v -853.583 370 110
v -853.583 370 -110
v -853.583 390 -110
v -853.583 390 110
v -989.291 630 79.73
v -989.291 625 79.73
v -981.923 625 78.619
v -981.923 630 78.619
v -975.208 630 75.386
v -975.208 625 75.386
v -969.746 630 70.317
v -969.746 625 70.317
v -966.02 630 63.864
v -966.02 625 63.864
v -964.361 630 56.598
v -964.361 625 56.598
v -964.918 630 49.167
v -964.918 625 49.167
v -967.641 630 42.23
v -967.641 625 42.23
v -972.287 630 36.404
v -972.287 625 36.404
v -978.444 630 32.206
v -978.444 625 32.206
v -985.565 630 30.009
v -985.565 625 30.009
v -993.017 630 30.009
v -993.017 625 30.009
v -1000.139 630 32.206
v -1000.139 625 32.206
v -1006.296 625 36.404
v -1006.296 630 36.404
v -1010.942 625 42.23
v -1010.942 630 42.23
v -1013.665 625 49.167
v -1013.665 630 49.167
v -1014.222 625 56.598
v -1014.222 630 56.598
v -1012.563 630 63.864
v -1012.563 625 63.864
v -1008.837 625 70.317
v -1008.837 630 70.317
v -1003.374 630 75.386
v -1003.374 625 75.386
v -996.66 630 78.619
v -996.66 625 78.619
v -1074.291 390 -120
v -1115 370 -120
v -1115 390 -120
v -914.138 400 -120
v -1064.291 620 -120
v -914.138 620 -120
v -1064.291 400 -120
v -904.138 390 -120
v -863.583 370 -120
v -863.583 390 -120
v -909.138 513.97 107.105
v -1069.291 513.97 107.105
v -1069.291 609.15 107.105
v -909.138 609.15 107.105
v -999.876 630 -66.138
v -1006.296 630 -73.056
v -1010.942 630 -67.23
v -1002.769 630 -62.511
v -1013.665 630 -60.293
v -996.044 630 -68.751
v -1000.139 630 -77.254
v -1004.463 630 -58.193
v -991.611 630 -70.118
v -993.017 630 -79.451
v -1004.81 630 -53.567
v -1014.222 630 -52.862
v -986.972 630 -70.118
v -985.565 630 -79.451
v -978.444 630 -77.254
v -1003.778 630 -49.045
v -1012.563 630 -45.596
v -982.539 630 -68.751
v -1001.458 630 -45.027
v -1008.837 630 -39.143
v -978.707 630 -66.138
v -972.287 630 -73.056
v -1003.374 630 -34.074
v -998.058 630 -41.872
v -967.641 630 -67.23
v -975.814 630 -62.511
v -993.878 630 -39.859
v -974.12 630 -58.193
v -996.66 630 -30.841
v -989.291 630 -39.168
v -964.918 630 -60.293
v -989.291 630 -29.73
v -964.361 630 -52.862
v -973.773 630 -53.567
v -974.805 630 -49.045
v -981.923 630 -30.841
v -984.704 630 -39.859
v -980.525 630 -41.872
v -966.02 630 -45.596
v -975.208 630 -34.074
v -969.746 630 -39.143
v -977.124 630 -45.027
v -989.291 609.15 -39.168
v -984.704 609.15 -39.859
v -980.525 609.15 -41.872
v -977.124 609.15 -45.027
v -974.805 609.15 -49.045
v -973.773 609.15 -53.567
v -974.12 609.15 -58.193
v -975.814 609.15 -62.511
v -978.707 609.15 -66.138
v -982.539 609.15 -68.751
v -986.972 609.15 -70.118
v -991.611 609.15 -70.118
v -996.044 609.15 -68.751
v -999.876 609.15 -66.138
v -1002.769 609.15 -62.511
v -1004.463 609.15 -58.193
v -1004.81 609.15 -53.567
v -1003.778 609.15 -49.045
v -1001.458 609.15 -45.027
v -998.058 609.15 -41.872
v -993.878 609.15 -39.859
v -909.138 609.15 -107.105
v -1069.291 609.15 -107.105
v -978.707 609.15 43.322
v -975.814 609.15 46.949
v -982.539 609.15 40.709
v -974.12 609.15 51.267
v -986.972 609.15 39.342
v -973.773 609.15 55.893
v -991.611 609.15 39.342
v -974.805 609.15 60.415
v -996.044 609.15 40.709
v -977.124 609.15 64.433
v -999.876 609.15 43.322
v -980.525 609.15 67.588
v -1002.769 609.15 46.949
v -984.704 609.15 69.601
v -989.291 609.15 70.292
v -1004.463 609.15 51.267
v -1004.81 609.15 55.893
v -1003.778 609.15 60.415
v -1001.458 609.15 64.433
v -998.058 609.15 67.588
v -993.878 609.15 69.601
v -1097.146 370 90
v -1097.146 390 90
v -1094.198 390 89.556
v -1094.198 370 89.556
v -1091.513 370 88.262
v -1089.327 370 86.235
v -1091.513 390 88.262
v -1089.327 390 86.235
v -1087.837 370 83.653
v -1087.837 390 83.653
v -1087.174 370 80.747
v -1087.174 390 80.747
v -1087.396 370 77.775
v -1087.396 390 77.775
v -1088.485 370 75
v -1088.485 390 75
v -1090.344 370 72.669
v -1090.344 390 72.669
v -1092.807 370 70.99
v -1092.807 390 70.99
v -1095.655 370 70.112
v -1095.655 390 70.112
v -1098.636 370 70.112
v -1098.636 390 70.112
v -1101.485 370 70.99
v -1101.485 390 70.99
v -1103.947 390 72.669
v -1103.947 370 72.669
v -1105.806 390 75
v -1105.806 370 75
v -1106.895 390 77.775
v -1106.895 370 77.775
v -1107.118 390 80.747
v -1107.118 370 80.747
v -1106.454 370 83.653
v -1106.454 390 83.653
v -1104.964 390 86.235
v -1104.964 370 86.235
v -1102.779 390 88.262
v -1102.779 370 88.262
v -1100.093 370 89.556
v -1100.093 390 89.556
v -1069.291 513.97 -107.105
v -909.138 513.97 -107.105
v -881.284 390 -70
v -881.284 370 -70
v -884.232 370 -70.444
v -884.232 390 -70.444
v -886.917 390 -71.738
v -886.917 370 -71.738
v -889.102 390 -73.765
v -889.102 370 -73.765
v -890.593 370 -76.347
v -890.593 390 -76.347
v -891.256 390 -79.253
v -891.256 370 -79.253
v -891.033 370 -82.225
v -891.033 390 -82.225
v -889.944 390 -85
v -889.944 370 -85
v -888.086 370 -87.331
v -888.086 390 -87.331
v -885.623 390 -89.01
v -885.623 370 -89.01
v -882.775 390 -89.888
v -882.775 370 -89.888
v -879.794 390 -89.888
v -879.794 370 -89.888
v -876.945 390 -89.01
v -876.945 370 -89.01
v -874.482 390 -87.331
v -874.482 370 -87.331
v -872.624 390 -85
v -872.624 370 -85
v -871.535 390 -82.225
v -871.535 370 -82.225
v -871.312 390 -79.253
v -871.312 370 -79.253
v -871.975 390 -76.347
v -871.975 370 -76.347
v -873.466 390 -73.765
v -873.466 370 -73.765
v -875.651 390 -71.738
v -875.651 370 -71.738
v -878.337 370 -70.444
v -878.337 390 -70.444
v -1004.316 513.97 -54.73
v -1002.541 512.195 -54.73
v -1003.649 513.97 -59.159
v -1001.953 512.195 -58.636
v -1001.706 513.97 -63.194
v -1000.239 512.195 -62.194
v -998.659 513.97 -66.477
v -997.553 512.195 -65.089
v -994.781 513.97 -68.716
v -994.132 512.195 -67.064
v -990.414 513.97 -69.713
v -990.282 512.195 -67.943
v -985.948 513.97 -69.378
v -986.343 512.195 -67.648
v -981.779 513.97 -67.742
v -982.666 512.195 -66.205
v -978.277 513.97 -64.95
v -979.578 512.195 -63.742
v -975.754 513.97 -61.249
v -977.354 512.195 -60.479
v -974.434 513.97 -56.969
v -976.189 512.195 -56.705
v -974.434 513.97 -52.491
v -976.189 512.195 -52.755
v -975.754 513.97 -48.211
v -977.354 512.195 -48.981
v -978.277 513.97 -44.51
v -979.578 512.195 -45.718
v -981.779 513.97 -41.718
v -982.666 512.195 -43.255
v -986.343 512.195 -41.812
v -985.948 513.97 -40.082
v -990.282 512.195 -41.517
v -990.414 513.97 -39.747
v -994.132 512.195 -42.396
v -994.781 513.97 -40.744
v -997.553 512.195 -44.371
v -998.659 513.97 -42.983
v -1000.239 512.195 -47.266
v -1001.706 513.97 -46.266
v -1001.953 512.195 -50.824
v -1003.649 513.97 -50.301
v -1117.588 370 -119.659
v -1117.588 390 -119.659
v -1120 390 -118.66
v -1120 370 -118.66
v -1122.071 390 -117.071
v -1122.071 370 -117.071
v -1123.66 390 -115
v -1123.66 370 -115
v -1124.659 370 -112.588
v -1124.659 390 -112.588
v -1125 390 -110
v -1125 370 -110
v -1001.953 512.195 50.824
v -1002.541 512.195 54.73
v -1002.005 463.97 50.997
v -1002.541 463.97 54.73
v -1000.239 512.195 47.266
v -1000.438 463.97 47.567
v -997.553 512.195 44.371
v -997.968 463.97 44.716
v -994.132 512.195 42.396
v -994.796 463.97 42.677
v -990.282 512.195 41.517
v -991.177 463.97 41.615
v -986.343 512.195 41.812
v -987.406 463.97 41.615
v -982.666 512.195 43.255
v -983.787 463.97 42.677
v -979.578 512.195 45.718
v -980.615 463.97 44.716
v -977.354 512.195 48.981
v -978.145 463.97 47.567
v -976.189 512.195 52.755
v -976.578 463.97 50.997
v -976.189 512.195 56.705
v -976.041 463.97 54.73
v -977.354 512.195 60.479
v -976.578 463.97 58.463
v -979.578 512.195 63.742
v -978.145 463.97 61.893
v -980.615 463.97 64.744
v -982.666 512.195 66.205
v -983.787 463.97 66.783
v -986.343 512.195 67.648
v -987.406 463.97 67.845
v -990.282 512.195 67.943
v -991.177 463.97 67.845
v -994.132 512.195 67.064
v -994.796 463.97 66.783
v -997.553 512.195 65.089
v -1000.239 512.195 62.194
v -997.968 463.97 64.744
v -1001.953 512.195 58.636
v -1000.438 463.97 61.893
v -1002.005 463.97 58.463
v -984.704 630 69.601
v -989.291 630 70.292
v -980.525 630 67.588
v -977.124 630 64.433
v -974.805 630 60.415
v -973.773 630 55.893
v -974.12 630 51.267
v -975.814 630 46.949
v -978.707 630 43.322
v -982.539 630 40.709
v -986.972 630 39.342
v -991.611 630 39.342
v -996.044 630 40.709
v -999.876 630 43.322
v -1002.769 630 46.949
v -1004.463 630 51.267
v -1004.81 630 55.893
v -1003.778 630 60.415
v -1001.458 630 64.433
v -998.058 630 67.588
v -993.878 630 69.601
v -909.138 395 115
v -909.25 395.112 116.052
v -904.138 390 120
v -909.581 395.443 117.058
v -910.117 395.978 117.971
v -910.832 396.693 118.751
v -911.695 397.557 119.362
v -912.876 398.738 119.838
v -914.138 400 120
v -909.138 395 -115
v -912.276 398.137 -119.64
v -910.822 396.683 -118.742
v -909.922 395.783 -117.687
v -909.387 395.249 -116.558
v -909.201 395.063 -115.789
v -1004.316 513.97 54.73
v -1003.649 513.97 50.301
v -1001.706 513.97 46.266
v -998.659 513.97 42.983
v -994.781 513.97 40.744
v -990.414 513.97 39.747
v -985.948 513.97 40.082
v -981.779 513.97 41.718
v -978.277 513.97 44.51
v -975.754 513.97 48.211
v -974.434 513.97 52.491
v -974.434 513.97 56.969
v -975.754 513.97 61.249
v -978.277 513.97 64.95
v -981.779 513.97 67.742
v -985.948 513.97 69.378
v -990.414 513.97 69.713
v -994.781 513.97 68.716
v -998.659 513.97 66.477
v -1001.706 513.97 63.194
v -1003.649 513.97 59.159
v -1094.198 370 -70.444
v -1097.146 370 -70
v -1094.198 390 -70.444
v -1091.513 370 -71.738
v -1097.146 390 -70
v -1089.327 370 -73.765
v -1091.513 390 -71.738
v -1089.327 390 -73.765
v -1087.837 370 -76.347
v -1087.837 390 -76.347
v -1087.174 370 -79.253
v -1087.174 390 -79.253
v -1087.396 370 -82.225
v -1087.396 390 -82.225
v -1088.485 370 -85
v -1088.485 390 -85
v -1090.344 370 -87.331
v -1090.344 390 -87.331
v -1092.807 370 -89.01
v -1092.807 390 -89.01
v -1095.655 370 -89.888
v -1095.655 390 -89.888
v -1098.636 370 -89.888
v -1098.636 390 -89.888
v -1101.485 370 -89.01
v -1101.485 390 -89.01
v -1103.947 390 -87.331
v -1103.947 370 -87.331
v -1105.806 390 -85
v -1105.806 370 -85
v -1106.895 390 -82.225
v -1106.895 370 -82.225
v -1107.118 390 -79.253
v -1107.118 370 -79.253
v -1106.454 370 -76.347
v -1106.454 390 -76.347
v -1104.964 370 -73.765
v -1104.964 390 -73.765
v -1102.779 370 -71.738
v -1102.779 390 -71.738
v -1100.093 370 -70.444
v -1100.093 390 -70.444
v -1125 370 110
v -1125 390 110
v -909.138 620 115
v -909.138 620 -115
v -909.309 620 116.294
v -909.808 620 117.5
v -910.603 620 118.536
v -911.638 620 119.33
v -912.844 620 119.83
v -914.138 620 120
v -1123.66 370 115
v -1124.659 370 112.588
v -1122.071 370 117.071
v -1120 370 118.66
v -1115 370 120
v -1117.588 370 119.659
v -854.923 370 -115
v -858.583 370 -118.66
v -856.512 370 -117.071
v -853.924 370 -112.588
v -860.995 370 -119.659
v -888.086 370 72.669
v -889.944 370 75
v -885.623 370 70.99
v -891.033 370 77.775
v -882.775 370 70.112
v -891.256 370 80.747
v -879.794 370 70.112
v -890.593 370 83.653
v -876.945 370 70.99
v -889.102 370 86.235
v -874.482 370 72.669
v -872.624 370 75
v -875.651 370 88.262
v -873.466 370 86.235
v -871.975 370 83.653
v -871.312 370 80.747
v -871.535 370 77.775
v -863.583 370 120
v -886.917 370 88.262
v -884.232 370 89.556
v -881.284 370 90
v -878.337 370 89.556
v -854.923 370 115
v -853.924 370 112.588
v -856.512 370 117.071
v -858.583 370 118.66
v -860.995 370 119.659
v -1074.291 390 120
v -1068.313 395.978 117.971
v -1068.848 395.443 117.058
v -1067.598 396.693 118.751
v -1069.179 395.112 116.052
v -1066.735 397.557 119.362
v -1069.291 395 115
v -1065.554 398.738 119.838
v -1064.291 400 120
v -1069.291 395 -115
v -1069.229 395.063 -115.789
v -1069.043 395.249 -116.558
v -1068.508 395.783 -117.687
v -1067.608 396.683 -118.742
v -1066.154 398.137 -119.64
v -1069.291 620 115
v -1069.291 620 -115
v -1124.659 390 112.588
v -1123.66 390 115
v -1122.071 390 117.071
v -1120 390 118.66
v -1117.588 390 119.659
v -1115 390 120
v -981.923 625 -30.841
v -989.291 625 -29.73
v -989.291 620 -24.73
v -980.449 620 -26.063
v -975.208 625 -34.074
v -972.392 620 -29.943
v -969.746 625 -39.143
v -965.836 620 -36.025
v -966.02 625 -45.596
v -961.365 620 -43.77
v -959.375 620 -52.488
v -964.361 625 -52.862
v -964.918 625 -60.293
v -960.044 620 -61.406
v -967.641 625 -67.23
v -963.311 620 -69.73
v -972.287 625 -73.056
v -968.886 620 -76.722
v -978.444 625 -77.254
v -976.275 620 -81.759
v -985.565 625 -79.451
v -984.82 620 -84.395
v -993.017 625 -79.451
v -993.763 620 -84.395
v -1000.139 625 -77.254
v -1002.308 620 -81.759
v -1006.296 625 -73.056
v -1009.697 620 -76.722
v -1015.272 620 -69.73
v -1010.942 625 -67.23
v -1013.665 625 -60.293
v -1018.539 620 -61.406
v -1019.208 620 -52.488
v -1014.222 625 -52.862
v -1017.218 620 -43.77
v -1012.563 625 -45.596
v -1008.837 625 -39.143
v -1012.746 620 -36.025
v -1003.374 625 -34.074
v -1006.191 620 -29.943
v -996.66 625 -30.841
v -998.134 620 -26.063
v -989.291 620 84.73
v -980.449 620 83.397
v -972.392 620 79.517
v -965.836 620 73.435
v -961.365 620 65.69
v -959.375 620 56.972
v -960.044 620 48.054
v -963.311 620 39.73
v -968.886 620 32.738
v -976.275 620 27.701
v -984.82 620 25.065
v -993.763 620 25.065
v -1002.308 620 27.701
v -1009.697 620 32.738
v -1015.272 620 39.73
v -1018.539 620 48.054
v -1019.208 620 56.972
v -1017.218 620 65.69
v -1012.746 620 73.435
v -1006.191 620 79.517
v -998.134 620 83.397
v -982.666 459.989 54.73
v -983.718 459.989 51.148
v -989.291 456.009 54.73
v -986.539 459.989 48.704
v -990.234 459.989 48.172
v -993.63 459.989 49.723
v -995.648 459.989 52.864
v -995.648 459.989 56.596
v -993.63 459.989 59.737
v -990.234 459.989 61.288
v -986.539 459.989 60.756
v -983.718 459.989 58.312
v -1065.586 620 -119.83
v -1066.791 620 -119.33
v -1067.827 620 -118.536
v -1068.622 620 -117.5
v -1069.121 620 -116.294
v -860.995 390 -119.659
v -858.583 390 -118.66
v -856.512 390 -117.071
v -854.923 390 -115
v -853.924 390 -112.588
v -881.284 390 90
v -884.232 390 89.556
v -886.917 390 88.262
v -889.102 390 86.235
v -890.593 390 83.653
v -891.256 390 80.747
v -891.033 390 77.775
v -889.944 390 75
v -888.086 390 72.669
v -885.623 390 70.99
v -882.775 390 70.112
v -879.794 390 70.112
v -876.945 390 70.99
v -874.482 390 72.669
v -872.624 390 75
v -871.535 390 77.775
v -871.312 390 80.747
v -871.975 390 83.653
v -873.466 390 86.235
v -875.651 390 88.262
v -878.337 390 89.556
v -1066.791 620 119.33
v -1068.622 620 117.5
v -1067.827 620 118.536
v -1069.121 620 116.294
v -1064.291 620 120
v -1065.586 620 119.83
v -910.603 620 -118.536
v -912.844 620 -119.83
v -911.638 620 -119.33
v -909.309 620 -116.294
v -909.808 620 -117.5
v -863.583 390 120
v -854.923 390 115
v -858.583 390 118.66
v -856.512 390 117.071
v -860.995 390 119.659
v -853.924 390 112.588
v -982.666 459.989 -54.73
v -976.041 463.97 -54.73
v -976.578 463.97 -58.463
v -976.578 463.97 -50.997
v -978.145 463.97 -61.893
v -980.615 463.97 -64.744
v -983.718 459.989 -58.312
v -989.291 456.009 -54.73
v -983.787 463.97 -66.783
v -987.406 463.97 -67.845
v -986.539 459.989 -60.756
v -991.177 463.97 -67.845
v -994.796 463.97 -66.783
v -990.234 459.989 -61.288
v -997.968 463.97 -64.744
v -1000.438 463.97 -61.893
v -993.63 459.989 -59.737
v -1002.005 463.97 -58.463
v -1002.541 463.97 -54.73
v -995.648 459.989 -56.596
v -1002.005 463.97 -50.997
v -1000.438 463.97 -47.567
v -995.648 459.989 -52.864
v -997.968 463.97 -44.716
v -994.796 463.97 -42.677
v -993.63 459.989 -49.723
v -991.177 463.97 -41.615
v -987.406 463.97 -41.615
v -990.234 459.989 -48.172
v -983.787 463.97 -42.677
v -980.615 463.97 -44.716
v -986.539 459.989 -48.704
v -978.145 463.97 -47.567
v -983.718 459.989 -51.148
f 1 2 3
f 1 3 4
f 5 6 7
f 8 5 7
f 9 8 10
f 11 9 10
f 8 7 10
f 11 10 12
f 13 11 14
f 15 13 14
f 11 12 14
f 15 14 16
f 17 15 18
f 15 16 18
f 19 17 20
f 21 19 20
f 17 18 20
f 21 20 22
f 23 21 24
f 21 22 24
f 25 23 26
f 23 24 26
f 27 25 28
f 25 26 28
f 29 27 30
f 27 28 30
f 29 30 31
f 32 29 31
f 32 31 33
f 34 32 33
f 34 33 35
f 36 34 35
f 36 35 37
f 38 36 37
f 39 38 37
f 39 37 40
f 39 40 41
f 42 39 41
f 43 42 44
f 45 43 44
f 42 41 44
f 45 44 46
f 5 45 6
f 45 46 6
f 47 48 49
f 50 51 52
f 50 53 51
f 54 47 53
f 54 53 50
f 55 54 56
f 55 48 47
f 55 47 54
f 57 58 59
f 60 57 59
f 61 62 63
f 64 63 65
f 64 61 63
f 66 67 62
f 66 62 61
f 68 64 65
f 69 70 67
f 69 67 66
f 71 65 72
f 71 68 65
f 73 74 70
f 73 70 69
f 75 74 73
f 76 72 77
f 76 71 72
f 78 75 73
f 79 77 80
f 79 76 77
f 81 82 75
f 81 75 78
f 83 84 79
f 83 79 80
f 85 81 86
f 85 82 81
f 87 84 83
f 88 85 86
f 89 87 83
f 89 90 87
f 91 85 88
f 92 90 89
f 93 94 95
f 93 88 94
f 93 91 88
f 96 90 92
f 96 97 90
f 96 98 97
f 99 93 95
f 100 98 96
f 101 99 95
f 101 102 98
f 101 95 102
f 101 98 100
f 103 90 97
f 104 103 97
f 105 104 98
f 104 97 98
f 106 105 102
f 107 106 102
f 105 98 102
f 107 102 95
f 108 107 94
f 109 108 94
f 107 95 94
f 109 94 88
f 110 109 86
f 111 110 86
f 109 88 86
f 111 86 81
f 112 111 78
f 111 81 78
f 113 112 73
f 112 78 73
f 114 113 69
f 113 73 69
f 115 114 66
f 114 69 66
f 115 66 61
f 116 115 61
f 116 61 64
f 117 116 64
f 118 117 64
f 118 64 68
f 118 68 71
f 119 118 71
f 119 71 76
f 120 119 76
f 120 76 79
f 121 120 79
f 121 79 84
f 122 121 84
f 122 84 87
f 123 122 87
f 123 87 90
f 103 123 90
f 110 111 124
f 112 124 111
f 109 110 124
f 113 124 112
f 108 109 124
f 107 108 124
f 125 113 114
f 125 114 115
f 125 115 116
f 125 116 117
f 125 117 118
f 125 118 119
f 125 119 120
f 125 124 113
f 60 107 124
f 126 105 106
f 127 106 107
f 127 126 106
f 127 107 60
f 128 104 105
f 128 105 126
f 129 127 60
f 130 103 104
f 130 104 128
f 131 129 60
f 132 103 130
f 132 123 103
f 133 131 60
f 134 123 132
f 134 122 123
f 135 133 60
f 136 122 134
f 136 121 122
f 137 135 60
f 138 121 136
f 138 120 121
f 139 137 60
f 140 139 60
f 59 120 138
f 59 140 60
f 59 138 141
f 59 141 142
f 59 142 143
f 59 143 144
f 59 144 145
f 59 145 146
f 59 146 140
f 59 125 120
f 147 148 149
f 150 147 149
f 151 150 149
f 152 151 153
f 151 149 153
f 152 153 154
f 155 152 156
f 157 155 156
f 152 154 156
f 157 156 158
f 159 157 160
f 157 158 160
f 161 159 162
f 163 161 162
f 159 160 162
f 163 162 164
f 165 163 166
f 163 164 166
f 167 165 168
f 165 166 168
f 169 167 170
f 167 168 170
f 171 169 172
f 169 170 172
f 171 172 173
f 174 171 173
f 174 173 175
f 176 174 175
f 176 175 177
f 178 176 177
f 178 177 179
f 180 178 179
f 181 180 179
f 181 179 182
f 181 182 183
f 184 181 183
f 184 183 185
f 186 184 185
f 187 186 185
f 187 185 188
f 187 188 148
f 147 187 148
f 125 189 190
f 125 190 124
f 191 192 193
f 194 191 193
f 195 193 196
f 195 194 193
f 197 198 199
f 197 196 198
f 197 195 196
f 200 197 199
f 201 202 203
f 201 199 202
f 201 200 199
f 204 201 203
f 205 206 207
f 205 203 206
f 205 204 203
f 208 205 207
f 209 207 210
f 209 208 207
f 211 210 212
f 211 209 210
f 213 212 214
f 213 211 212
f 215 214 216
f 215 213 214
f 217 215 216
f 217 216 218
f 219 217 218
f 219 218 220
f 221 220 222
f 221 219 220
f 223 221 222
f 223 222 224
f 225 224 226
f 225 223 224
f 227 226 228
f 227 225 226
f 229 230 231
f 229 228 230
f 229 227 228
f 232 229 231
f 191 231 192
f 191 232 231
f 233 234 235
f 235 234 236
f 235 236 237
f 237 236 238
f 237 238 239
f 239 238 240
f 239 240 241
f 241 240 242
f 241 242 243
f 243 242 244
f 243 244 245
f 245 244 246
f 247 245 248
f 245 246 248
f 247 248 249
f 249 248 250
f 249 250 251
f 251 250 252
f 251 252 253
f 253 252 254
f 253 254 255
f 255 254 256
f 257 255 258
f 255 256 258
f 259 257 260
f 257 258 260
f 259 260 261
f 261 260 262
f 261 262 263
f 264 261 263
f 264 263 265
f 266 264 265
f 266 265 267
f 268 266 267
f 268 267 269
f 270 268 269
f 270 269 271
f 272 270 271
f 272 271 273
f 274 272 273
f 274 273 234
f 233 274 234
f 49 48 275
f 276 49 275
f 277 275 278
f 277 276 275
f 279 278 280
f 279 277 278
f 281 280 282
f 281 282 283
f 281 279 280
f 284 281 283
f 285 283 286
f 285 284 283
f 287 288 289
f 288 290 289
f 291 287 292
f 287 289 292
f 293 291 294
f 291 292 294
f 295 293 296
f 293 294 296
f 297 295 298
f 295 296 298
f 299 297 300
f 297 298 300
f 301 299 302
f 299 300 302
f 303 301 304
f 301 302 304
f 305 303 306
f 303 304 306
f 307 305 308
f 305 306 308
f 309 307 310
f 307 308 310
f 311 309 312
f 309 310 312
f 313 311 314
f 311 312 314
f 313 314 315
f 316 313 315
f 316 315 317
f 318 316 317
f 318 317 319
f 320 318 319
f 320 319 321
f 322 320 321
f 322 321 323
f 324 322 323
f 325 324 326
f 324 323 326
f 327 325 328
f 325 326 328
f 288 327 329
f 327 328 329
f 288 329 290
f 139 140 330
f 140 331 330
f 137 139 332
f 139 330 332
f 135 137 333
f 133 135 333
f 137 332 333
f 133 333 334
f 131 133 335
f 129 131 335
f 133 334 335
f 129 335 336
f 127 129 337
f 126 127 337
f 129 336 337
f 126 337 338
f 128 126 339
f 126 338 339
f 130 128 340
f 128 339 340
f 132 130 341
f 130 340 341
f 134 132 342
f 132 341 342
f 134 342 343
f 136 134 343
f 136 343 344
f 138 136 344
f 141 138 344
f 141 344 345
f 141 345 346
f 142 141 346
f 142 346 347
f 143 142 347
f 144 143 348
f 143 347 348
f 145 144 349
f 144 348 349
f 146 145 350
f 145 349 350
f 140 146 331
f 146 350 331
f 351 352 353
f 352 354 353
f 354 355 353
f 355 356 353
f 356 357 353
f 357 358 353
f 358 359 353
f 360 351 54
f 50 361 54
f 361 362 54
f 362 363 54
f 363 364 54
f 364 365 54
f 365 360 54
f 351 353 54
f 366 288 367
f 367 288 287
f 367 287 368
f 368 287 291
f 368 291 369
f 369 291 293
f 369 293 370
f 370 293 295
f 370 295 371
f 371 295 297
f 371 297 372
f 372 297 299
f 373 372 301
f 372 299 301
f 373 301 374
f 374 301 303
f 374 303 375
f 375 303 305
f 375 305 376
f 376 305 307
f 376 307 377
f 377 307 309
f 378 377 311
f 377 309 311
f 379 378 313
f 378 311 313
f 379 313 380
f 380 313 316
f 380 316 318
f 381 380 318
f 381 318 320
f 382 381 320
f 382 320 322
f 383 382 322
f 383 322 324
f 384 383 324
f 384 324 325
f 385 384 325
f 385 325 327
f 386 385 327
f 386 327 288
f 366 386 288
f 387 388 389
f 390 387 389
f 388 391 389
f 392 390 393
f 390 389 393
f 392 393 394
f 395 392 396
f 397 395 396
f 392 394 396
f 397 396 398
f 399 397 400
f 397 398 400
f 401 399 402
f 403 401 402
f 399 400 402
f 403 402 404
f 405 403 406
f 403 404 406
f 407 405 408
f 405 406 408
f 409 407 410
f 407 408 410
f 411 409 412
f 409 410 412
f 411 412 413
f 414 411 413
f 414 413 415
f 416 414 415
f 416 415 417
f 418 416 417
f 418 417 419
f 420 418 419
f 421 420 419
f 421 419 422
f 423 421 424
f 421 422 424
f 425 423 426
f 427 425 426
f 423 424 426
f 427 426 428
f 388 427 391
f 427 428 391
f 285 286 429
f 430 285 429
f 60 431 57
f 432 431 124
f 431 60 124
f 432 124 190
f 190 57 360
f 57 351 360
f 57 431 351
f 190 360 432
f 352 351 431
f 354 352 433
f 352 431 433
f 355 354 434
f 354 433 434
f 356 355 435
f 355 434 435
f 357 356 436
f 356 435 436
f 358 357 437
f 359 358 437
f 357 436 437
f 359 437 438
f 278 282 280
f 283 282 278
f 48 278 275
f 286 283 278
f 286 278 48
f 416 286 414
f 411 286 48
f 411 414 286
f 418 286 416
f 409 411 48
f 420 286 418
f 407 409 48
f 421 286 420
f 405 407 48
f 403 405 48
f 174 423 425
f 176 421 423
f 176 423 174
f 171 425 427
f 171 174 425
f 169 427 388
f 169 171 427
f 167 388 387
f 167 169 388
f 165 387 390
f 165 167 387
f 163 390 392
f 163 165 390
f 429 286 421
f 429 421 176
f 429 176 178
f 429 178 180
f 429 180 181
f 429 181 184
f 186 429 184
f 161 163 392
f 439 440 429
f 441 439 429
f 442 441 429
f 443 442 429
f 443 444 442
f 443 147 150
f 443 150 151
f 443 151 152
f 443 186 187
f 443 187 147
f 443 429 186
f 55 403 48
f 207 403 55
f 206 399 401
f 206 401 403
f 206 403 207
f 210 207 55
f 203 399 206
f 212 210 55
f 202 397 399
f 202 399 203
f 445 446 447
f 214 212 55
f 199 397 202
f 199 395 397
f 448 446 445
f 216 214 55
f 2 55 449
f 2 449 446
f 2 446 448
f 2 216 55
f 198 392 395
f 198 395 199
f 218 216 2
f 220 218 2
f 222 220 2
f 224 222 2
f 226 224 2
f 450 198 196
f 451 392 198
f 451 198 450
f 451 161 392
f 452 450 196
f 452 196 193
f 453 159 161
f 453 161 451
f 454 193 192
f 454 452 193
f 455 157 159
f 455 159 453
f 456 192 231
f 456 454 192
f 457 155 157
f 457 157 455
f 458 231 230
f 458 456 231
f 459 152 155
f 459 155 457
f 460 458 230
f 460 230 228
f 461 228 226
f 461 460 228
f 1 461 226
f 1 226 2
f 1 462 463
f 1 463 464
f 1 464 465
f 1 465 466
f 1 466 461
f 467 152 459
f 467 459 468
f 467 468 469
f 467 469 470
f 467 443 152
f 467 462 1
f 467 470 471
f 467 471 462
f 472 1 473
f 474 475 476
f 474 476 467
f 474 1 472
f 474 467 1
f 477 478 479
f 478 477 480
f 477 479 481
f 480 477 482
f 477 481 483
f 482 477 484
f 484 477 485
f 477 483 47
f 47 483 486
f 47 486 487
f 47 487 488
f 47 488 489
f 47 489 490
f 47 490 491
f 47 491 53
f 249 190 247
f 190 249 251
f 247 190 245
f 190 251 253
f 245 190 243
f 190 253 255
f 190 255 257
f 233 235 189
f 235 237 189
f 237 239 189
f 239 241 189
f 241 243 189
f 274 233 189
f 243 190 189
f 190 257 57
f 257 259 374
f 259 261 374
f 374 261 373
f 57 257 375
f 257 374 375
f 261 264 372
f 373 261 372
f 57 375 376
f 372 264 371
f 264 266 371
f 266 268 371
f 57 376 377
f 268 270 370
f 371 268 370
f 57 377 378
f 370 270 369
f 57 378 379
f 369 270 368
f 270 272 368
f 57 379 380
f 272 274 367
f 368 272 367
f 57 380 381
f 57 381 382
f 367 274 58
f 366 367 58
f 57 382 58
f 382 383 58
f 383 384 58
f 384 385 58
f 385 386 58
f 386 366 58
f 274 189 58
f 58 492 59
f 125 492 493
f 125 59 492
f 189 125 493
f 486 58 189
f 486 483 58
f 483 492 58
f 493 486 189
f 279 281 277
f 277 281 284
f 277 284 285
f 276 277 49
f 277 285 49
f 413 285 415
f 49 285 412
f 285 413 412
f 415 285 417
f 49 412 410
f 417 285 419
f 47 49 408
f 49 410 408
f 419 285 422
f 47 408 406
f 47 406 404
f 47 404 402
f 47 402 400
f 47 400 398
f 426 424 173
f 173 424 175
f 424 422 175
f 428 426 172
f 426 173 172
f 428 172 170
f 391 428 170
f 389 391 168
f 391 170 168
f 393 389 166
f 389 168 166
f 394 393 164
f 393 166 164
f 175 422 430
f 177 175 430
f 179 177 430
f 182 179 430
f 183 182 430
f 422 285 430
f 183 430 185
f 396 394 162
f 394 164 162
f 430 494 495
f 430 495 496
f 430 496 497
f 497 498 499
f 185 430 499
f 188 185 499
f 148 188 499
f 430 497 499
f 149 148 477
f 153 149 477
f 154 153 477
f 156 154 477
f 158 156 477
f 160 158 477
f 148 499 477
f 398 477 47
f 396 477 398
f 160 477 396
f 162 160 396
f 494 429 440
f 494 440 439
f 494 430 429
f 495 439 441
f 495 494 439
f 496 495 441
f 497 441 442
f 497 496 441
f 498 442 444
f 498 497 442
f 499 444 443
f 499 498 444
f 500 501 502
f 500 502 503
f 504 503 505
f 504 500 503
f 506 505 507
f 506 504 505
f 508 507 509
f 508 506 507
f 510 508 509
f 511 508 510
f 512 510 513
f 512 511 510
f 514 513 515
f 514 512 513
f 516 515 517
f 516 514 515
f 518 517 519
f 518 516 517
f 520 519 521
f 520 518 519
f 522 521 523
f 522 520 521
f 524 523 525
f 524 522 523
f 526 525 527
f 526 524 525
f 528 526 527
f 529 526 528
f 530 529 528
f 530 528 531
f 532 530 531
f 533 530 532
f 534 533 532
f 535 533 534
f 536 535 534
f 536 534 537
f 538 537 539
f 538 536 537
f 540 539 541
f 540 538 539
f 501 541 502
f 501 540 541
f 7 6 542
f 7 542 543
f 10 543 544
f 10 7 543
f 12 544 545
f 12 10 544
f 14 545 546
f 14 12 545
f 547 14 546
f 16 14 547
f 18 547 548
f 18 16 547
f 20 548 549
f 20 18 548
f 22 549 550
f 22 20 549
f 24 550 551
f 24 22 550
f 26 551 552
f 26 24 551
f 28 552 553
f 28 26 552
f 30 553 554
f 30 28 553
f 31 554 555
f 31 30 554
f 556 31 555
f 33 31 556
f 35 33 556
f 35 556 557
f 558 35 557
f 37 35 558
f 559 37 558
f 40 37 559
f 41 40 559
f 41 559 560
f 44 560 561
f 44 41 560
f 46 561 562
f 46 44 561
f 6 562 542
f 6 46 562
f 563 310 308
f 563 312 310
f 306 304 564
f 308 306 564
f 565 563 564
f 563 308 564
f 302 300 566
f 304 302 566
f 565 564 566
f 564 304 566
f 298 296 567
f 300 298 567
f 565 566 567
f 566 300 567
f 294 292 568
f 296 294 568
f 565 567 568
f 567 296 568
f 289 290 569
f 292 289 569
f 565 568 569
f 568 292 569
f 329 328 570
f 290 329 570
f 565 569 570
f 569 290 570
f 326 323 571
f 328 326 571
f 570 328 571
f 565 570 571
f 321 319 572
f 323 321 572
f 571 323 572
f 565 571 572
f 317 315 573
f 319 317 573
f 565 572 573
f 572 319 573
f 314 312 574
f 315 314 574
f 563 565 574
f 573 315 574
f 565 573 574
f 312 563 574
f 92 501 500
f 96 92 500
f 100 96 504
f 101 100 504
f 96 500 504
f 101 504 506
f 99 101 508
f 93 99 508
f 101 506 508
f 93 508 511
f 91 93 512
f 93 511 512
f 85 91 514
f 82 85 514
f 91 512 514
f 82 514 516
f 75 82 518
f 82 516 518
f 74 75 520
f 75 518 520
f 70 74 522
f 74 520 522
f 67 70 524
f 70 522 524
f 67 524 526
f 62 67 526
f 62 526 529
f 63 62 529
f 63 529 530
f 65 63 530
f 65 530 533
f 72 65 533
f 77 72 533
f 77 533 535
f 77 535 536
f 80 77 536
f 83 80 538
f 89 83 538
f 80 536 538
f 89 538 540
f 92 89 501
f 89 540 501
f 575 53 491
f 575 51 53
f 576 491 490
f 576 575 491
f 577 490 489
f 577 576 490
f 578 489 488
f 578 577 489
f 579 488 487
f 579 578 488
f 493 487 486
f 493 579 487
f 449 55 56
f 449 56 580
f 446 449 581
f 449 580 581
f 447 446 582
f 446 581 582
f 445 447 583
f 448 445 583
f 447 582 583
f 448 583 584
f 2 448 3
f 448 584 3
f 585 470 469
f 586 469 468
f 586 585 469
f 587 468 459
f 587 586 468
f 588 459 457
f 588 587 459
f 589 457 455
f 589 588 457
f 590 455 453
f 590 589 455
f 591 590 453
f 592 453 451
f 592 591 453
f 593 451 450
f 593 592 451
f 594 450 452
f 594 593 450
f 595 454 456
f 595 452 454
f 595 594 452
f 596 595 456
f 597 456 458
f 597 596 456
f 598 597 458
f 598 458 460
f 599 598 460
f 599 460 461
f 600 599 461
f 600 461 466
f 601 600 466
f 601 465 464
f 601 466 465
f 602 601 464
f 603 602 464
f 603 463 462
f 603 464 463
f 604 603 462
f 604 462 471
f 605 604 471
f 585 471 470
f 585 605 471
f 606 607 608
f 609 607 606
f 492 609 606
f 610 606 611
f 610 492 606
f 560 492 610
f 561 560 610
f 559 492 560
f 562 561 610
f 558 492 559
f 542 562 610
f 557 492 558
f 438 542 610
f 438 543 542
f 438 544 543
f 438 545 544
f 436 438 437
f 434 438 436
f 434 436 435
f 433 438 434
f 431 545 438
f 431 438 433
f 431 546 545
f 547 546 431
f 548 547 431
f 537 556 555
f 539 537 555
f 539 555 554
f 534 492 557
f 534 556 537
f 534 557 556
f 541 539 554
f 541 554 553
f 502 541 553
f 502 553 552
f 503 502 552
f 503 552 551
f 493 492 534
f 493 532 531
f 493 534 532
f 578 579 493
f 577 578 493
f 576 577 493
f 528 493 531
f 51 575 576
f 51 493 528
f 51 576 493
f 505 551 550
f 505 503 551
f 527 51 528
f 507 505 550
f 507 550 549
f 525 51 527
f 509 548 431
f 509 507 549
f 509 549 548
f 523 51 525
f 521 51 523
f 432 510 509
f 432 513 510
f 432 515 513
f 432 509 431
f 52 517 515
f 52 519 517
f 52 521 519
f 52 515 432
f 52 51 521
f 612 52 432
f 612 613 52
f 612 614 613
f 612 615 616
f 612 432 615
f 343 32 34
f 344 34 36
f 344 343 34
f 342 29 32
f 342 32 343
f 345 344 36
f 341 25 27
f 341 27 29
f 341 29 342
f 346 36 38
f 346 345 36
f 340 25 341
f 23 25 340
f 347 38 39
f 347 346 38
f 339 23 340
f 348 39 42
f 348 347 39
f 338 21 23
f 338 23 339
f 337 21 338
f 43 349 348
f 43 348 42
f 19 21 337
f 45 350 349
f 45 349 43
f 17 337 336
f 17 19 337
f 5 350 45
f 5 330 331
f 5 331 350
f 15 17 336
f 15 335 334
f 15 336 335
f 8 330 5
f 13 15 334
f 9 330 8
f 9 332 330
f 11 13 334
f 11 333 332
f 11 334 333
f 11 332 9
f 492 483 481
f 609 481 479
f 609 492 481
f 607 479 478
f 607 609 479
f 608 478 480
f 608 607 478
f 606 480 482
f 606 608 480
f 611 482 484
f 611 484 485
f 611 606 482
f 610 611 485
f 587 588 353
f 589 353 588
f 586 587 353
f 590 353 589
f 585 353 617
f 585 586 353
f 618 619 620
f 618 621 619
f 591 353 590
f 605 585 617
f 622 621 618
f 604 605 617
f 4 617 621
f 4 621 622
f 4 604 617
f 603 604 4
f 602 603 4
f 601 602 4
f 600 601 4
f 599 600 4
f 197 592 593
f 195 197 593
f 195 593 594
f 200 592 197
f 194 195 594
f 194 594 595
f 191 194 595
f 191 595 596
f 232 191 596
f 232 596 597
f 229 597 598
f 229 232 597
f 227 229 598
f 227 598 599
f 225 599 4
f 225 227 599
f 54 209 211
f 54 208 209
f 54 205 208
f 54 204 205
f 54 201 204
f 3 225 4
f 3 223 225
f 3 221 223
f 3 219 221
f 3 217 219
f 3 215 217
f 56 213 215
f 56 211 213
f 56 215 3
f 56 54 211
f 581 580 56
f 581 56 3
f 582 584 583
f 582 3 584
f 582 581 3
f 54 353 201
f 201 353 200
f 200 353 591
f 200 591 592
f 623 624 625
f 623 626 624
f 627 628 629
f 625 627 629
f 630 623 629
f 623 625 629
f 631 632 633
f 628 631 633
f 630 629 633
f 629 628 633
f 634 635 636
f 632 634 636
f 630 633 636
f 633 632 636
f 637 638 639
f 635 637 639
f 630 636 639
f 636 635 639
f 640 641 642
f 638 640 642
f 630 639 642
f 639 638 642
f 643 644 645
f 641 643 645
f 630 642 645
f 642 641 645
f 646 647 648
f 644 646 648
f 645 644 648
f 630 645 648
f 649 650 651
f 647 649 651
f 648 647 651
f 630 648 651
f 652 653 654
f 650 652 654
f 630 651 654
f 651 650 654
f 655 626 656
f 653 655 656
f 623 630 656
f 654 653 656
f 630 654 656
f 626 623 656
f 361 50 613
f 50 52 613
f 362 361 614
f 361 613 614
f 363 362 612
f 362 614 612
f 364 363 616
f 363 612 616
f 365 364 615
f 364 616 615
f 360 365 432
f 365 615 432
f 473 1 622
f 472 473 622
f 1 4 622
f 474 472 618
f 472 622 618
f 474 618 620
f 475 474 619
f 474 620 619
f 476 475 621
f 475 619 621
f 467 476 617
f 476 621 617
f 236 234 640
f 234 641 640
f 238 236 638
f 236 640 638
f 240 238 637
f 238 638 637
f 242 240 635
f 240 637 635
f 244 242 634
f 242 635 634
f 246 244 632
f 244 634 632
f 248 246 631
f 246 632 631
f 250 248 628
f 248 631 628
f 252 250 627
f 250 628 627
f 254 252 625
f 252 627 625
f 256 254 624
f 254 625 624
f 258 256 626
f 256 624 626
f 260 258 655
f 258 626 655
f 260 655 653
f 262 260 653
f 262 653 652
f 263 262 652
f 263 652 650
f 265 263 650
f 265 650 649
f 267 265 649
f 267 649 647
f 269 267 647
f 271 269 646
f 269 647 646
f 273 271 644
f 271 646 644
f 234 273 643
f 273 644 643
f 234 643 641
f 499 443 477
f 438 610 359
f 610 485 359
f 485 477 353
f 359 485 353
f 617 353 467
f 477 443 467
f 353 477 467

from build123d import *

# Parameters (mm, degrees)
SKETCH_1_W                    = 221.417168307
SKETCH_1_H                    = 240
EXTRUDE_1_DEPTH               = 20
SKETCH_2_W                    = 160.152997215
SKETCH_2_H                    = 240
EXTRUDE_2_DEPTH               = 230
SKETCH_3_W                    = 214.21
SKETCH_3_H                    = 95.18
CUT_EXTRUDE_1_DEPTH           = 660.673983169
HOLE_WIZARD_M30_1_D           = 26.5
HOLE_WIZARD_M30_1_DEPTH       = 50
HOLE_WIZARD_M30_1_CSINK_D     = 30.05
HOLE_WIZARD_M30_1_CSINK_ANGLE = 90
HOLE_WIZARD_M30_1_TIP         = 7.961403202
SKETCH_11_R                   = 15.562071092
CUT_EXTRUDE_3_DEPTH           = 20
SKETCH_12_R                   = 25
EXTRUDE_3_DEPTH               = 10
SKETCH_13_R                   = 15.562071092
CUT_EXTRUDE_4_DEPTH           = 29.5
SKETCH_14_W                   = 25
SKETCH_14_H                   = 240
EXTRUDE_4_DEPTH               = 20
SKETCH_15_R                   = 10
CUT_EXTRUDE_5_DEPTH           = 25
CHAMFER_1_SIZE                = 5
FILLET_1_R                    = 10
FILLET_2_R                    = 5


with BuildPart() as part:
    # 草图1 → 凸台-拉伸1 (new body)
    with BuildSketch(Plane(origin=(0, 370, 0), x_dir=(1, 0, 0), z_dir=(0, 1, 0))):
        with Locations((-989.291415847, 0)):
            Rectangle(SKETCH_1_W, SKETCH_1_H)
    extrude(amount=EXTRUDE_1_DEPTH)

    # 草图2 → 凸台-拉伸2 (add)
    with BuildSketch(Plane(origin=(0, 390, 0), x_dir=(1, 0, 0), z_dir=(0, 1, 0))):
        with Locations((-989.214917238, 0)):
            Rectangle(SKETCH_2_W, SKETCH_2_H)
    extrude(amount=EXTRUDE_2_DEPTH)

    # 草图3 → 切除-拉伸1 (cut, through all)
    with BuildSketch(Plane.ZY.offset(1069.291415846)):
        with Locations((0, 561.56)):
            Rectangle(SKETCH_3_W, SKETCH_3_H)
    extrude(amount=-CUT_EXTRUDE_1_DEPTH, mode=Mode.SUBTRACT)

    # M30 螺纹孔1
    with Locations(Plane(origin=(0, 513.97, 0), x_dir=(1, 0, 0), z_dir=(0, 1, 0))):
        with Locations((-989.291415846, 54.73), (-989.291415846, -54.73)):
            CounterSinkHole(HOLE_WIZARD_M30_1_D / 2, HOLE_WIZARD_M30_1_CSINK_D / 2, depth=HOLE_WIZARD_M30_1_DEPTH, counter_sink_angle=HOLE_WIZARD_M30_1_CSINK_ANGLE)
            with Locations((0, 0, -(HOLE_WIZARD_M30_1_DEPTH + HOLE_WIZARD_M30_1_TIP / 2))):  # 118° drill point
                Cone(0, HOLE_WIZARD_M30_1_D / 2, HOLE_WIZARD_M30_1_TIP, mode=Mode.SUBTRACT)

    # 草图11 → 切除-拉伸3 (cut)
    with BuildSketch(Plane(origin=(0, 620, 0), x_dir=(1, 0, 0), z_dir=(0, 1, 0))):
        with Locations(Location((-989.291415846, 54.73, 0), (0, 0, 270))):
            Circle(SKETCH_11_R)
        with Locations(Location((-989.291415846, -54.73, 0), (0, 0, 270))):
            Circle(SKETCH_11_R)
    extrude(amount=-CUT_EXTRUDE_3_DEPTH, mode=Mode.SUBTRACT)

    # 草图12 → 凸台-拉伸3 (add)
    with BuildSketch(Plane(origin=(0, 620, 0), x_dir=(1, 0, 0), z_dir=(0, 1, 0))):
        with Locations(Location((-989.291415846, 54.73, 0), (0, 0, 270))):
            Circle(SKETCH_12_R)
        with Locations(Location((-989.291415846, -54.73, 0), (0, 0, 270))):
            Circle(SKETCH_12_R)
    extrude(amount=EXTRUDE_3_DEPTH)

    # 草图13 → 切除-拉伸4 (cut, symmetric)
    with BuildSketch(Plane(origin=(0, 630, 0), x_dir=(1, 0, 0), z_dir=(0, 1, 0))):
        with Locations(Location((-989.291415846, 54.73, 0), (0, 0, 270))):
            Circle(SKETCH_13_R)
        with Locations(Location((-989.291415846, -54.73, 0), (0, 0, 270))):
            Circle(SKETCH_13_R)
    extrude(amount=CUT_EXTRUDE_4_DEPTH, both=True, mode=Mode.SUBTRACT)

    # 草图14 → 凸台-拉伸4 (add)
    with BuildSketch(Plane.XZ.offset(-370)):
        with Locations((-1112.5, 0)):
            Rectangle(SKETCH_14_W, SKETCH_14_H)
        with Locations((-866.082831693, 0)):
            Rectangle(SKETCH_14_W, SKETCH_14_H)
    extrude(amount=-EXTRUDE_4_DEPTH)

    # 草图15 → 切除-拉伸5 (cut, symmetric)
    with BuildSketch(Plane(origin=(0, 390, 0), x_dir=(1, 0, 0), z_dir=(0, 1, 0))):
        with Locations(Location((-1097.145707923, -80, 0), (0, 0, 270))):
            Circle(SKETCH_15_R)
        with Locations(Location((-1097.145707923, 80, 0), (0, 0, 270))):
            Circle(SKETCH_15_R)
    cut_extrude_5 = extrude(amount=CUT_EXTRUDE_5_DEPTH, both=True, mode=Mode.SUBTRACT)

    # 镜向1: 切除-拉伸5 across plane
    add(cut_extrude_5.mirror(Plane.ZY.offset(989.214917239)), mode=Mode.SUBTRACT)

    # 倒角1
    chamfer_1_edges = [part.edges().sort_by_distance(p)[0] for p in [
        (-1069.291415846, 390, 0),
        (-909.138418631, 390, 0),
        (-989.291415846, 620, -79.73),
        (-989.291415846, 620, 29.73),
    ]]
    chamfer(chamfer_1_edges, length=CHAMFER_1_SIZE)

    # 圆角1
    fillet_1_edges = [part.edges().sort_by_distance(p)[0] for p in [
        (-853.582831693, 380, -120),
        (-853.582831693, 380, 120),
        (-1125, 380, 120),
        (-1125, 380, -120),
    ]]
    fillet(fillet_1_edges, radius=FILLET_1_R)

    # 圆角2
    fillet_2_edges = [part.edges().sort_by_distance(p)[0] for p in [
        (-1069.291415846, 507.5, -120),
        (-1069.291415846, 507.5, 120),
        (-909.138418631, 507.5, 120),
        (-909.138418631, 507.5, -120),
    ]]
    fillet(fillet_2_edges, radius=FILLET_2_R)


solid = part.part
